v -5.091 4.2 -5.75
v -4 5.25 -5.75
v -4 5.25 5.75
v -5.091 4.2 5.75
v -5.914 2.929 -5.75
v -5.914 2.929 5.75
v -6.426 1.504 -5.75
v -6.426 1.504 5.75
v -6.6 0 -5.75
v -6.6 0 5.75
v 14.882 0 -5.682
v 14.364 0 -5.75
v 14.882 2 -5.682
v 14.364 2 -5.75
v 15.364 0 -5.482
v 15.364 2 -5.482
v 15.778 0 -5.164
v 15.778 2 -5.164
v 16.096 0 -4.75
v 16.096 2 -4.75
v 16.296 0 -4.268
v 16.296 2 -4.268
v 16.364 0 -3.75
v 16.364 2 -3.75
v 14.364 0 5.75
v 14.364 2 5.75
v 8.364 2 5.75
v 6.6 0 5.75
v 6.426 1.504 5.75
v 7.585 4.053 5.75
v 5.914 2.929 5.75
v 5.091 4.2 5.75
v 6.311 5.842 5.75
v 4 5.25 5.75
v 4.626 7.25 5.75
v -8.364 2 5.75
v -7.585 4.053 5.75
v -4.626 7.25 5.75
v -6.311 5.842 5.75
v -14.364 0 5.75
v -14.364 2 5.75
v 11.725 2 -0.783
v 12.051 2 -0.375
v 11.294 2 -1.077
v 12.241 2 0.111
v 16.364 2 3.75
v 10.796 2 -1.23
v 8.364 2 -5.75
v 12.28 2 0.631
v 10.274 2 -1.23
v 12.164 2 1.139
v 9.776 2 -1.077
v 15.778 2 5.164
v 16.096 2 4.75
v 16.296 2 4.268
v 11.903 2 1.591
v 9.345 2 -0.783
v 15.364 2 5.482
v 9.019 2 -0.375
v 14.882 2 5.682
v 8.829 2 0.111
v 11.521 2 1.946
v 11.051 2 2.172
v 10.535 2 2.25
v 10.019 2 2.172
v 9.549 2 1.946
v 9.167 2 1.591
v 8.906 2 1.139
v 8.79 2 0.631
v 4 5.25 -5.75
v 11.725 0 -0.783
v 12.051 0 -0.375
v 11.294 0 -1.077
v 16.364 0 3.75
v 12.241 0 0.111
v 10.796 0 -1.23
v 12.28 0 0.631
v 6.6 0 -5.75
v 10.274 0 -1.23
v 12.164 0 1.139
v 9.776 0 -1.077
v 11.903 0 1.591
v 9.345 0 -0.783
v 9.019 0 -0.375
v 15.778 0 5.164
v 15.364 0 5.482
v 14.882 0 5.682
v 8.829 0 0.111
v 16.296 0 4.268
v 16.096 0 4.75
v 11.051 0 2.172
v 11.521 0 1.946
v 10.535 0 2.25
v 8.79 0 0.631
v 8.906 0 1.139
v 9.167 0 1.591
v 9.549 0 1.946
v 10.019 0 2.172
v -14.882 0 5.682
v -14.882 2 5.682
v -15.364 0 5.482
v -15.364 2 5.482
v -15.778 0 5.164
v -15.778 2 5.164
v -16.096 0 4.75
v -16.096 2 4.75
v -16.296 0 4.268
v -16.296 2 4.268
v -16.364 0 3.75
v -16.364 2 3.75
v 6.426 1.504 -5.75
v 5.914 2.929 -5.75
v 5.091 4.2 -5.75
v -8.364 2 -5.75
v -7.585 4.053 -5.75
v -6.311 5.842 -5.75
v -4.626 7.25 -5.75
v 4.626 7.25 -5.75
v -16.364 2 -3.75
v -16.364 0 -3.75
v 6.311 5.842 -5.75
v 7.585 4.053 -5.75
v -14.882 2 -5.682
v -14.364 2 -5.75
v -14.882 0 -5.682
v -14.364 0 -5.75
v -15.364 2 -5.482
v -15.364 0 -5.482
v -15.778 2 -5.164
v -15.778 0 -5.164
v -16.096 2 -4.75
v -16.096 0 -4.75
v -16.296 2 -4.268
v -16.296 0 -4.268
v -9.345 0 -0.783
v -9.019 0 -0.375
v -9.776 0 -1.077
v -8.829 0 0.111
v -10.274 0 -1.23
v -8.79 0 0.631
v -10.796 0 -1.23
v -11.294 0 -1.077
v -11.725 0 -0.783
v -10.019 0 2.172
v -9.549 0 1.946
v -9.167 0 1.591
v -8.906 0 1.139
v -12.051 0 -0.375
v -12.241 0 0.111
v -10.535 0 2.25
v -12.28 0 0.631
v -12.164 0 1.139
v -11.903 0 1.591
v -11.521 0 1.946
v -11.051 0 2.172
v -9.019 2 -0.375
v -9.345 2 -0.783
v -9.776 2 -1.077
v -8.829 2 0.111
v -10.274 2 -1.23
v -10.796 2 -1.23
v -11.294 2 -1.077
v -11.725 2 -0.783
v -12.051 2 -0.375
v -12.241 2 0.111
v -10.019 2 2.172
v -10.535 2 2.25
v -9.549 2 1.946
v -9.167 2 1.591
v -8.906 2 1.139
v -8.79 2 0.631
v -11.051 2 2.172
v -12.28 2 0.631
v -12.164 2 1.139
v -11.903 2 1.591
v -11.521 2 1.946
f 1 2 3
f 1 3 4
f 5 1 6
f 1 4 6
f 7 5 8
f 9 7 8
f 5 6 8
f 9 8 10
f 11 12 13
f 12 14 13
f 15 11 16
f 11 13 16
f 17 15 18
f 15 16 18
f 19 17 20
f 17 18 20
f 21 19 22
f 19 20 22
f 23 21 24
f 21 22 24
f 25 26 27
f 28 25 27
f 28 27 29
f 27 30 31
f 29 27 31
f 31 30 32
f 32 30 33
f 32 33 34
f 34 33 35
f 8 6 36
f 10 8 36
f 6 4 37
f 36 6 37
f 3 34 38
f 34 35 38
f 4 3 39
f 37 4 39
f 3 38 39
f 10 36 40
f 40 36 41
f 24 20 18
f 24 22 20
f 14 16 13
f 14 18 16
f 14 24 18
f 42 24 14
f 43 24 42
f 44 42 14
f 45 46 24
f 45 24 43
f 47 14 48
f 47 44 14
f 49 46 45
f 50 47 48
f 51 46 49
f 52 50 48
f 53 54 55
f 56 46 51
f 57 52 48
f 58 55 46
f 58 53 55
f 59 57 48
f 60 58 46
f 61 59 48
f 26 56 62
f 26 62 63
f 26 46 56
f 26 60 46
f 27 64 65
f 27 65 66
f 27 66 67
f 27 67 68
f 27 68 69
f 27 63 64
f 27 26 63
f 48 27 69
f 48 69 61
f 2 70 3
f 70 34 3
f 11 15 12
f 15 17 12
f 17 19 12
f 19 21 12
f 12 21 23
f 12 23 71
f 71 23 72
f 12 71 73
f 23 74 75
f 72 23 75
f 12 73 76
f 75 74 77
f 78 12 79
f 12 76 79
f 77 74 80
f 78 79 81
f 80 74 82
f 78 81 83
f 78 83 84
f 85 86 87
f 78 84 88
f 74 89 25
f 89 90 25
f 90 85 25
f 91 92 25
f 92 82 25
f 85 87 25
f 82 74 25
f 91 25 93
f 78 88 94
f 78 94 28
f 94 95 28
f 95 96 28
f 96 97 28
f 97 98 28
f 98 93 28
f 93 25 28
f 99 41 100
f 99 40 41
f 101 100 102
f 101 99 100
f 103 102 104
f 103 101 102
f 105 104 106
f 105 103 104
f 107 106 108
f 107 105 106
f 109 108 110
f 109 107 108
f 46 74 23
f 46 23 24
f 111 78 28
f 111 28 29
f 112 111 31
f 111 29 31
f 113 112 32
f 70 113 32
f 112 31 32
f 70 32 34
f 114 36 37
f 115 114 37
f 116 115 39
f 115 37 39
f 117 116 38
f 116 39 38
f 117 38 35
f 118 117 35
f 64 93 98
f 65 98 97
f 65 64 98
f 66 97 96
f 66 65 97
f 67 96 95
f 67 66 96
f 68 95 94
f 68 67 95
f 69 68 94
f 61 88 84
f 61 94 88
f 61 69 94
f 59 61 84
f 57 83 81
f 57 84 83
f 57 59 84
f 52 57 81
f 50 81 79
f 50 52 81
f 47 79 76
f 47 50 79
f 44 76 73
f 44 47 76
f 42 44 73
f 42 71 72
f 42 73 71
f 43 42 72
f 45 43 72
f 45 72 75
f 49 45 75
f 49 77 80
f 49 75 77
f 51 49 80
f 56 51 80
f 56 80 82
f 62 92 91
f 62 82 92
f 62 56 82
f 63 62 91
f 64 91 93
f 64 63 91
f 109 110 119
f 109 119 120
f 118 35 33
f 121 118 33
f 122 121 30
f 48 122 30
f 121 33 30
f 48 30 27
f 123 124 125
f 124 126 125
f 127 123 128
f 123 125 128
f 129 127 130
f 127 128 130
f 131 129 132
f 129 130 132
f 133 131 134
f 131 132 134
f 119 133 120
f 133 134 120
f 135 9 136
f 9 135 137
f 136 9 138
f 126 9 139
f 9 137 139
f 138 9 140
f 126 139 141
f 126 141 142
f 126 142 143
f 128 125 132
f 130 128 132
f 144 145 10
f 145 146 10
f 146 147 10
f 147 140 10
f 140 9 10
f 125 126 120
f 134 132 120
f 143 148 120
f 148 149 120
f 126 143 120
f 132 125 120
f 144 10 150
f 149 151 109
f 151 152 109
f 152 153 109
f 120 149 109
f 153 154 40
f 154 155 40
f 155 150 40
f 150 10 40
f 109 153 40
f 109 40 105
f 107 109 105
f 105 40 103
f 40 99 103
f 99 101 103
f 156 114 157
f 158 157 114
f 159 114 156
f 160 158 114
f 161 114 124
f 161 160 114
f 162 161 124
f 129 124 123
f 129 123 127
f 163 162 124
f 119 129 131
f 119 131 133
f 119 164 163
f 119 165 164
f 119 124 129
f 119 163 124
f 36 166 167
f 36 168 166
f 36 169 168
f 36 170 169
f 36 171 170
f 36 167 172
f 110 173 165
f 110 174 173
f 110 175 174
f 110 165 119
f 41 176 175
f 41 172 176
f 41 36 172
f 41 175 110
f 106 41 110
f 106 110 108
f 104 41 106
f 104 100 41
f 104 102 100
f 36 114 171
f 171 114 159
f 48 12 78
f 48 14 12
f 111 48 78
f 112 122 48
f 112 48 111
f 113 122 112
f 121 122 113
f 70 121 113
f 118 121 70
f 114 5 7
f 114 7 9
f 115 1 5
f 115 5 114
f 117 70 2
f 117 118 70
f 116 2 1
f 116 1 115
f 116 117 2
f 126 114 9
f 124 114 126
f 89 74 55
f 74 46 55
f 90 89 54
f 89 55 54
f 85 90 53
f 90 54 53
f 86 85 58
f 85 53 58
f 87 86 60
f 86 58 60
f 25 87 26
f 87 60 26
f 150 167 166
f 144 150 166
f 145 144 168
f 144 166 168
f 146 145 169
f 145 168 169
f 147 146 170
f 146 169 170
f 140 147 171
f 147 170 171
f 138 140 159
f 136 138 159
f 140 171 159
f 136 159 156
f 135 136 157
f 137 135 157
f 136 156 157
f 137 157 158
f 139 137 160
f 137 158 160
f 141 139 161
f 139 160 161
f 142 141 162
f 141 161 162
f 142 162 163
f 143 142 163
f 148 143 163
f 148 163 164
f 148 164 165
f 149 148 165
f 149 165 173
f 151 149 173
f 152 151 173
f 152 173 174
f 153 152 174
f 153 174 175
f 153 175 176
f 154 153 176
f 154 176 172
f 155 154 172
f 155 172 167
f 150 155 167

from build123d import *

# Parameters (mm, degrees)
BOSS_EXTRUDE1_DEPTH   = 5.75
BOSS_EXTRUDE1_2_DEPTH = 5.75
BOSS_EXTRUDE2_DEPTH   = 5.75
SKETCH3_R             = 1.75
CUT_EXTRUDE2_DEPTH    = 19.122150851
FILLET1_R             = 2


with BuildPart() as part:
    # Sketch2 → Boss-Extrude1 (new, symmetric)
    with BuildSketch(Plane.XY):
        with BuildLine():
            Line((-16.364209467, 0), (-8.6, 0))
            ThreePointArc((-8.6, 0), (-8.540848945, 1.006925665), (-8.364209467, 2))
            Line((-8.364209467, 2), (-16.364209467, 2))
            Line((-16.364209467, 2), (-16.364209467, 0))
        make_face()
    extrude(amount=BOSS_EXTRUDE1_DEPTH, both=True)



with BuildPart() as body_2:
    # Sketch2 → Boss-Extrude1 2 (new, symmetric)
    with BuildSketch(Plane.XY):
        with BuildLine():
            ThreePointArc((8.364209467, 2), (8.540848945, 1.006925665), (8.6, 0))
            Line((8.6, 0), (16.364209467, 0))
            Line((16.364209467, 0), (16.364209467, 2))
            Line((16.364209467, 2), (8.364209467, 2))
        make_face()
    extrude(amount=BOSS_EXTRUDE1_2_DEPTH, both=True)


with BuildPart() as part_1:
    add(part.part)

    add(body_2.part)  # Boss-Extrude2 merges body 2
    # Sketch2<4> → Boss-Extrude2 (add, symmetric)
    with BuildSketch(Plane.XY):
        with BuildLine():
            Line((-8.6, 0), (-6.6, 0))
            ThreePointArc((-6.6, 0), (-5.914302048, 2.929339736), (-3.999687488, 5.25))
            Line((-3.999687488, 5.25), (3.999687488, 5.25))
            ThreePointArc((3.999687488, 5.25), (5.914302048, 2.929339736), (6.6, 0))
            Line((6.6, 0), (8.6, 0))
            ThreePointArc((8.6, 0), (8.540848945, 1.006925665), (8.364209467, 2))
            ThreePointArc((8.364209467, 2), (7.005379537, 4.988452419), (4.625743184, 7.25))
            Line((4.625743184, 7.25), (-4.625743184, 7.25))
            ThreePointArc((-4.625743184, 7.25), (-7.005379537, 4.988452419), (-8.364209467, 2))
            ThreePointArc((-8.364209467, 2), (-8.540848945, 1.006925665), (-8.6, 0))
        make_face()
    extrude(amount=BOSS_EXTRUDE2_DEPTH, both=True)

    # Sketch3 → Cut-Extrude2 (cut, through all)
    with BuildSketch(Plane(origin=(0, 2, 0), x_dir=(1, 0, 0), z_dir=(0, 1, 0))):
        with Locations((-10.535, -0.5)):
            Circle(SKETCH3_R)
    cut_extrude2 = extrude(amount=-CUT_EXTRUDE2_DEPTH, mode=Mode.SUBTRACT)

    # Mirror1: Cut-Extrude2 across plane
    add(cut_extrude2.mirror(Plane(origin=(0, 0, 0), x_dir=(0, 0, 1), z_dir=(1, 0, 0))), mode=Mode.SUBTRACT)

    # Fillet1
    fillet1_edges = [part_1.edges().sort_by_distance(p)[0] for p in [
        (-16.364209467, 1, 5.75),
        (-16.364209467, 1, -5.75),
        (16.364209467, 1, -5.75),
        (16.364209467, 1, 5.75),
    ]]
    fillet(fillet1_edges, radius=FILLET1_R)


solid = part_1.part
